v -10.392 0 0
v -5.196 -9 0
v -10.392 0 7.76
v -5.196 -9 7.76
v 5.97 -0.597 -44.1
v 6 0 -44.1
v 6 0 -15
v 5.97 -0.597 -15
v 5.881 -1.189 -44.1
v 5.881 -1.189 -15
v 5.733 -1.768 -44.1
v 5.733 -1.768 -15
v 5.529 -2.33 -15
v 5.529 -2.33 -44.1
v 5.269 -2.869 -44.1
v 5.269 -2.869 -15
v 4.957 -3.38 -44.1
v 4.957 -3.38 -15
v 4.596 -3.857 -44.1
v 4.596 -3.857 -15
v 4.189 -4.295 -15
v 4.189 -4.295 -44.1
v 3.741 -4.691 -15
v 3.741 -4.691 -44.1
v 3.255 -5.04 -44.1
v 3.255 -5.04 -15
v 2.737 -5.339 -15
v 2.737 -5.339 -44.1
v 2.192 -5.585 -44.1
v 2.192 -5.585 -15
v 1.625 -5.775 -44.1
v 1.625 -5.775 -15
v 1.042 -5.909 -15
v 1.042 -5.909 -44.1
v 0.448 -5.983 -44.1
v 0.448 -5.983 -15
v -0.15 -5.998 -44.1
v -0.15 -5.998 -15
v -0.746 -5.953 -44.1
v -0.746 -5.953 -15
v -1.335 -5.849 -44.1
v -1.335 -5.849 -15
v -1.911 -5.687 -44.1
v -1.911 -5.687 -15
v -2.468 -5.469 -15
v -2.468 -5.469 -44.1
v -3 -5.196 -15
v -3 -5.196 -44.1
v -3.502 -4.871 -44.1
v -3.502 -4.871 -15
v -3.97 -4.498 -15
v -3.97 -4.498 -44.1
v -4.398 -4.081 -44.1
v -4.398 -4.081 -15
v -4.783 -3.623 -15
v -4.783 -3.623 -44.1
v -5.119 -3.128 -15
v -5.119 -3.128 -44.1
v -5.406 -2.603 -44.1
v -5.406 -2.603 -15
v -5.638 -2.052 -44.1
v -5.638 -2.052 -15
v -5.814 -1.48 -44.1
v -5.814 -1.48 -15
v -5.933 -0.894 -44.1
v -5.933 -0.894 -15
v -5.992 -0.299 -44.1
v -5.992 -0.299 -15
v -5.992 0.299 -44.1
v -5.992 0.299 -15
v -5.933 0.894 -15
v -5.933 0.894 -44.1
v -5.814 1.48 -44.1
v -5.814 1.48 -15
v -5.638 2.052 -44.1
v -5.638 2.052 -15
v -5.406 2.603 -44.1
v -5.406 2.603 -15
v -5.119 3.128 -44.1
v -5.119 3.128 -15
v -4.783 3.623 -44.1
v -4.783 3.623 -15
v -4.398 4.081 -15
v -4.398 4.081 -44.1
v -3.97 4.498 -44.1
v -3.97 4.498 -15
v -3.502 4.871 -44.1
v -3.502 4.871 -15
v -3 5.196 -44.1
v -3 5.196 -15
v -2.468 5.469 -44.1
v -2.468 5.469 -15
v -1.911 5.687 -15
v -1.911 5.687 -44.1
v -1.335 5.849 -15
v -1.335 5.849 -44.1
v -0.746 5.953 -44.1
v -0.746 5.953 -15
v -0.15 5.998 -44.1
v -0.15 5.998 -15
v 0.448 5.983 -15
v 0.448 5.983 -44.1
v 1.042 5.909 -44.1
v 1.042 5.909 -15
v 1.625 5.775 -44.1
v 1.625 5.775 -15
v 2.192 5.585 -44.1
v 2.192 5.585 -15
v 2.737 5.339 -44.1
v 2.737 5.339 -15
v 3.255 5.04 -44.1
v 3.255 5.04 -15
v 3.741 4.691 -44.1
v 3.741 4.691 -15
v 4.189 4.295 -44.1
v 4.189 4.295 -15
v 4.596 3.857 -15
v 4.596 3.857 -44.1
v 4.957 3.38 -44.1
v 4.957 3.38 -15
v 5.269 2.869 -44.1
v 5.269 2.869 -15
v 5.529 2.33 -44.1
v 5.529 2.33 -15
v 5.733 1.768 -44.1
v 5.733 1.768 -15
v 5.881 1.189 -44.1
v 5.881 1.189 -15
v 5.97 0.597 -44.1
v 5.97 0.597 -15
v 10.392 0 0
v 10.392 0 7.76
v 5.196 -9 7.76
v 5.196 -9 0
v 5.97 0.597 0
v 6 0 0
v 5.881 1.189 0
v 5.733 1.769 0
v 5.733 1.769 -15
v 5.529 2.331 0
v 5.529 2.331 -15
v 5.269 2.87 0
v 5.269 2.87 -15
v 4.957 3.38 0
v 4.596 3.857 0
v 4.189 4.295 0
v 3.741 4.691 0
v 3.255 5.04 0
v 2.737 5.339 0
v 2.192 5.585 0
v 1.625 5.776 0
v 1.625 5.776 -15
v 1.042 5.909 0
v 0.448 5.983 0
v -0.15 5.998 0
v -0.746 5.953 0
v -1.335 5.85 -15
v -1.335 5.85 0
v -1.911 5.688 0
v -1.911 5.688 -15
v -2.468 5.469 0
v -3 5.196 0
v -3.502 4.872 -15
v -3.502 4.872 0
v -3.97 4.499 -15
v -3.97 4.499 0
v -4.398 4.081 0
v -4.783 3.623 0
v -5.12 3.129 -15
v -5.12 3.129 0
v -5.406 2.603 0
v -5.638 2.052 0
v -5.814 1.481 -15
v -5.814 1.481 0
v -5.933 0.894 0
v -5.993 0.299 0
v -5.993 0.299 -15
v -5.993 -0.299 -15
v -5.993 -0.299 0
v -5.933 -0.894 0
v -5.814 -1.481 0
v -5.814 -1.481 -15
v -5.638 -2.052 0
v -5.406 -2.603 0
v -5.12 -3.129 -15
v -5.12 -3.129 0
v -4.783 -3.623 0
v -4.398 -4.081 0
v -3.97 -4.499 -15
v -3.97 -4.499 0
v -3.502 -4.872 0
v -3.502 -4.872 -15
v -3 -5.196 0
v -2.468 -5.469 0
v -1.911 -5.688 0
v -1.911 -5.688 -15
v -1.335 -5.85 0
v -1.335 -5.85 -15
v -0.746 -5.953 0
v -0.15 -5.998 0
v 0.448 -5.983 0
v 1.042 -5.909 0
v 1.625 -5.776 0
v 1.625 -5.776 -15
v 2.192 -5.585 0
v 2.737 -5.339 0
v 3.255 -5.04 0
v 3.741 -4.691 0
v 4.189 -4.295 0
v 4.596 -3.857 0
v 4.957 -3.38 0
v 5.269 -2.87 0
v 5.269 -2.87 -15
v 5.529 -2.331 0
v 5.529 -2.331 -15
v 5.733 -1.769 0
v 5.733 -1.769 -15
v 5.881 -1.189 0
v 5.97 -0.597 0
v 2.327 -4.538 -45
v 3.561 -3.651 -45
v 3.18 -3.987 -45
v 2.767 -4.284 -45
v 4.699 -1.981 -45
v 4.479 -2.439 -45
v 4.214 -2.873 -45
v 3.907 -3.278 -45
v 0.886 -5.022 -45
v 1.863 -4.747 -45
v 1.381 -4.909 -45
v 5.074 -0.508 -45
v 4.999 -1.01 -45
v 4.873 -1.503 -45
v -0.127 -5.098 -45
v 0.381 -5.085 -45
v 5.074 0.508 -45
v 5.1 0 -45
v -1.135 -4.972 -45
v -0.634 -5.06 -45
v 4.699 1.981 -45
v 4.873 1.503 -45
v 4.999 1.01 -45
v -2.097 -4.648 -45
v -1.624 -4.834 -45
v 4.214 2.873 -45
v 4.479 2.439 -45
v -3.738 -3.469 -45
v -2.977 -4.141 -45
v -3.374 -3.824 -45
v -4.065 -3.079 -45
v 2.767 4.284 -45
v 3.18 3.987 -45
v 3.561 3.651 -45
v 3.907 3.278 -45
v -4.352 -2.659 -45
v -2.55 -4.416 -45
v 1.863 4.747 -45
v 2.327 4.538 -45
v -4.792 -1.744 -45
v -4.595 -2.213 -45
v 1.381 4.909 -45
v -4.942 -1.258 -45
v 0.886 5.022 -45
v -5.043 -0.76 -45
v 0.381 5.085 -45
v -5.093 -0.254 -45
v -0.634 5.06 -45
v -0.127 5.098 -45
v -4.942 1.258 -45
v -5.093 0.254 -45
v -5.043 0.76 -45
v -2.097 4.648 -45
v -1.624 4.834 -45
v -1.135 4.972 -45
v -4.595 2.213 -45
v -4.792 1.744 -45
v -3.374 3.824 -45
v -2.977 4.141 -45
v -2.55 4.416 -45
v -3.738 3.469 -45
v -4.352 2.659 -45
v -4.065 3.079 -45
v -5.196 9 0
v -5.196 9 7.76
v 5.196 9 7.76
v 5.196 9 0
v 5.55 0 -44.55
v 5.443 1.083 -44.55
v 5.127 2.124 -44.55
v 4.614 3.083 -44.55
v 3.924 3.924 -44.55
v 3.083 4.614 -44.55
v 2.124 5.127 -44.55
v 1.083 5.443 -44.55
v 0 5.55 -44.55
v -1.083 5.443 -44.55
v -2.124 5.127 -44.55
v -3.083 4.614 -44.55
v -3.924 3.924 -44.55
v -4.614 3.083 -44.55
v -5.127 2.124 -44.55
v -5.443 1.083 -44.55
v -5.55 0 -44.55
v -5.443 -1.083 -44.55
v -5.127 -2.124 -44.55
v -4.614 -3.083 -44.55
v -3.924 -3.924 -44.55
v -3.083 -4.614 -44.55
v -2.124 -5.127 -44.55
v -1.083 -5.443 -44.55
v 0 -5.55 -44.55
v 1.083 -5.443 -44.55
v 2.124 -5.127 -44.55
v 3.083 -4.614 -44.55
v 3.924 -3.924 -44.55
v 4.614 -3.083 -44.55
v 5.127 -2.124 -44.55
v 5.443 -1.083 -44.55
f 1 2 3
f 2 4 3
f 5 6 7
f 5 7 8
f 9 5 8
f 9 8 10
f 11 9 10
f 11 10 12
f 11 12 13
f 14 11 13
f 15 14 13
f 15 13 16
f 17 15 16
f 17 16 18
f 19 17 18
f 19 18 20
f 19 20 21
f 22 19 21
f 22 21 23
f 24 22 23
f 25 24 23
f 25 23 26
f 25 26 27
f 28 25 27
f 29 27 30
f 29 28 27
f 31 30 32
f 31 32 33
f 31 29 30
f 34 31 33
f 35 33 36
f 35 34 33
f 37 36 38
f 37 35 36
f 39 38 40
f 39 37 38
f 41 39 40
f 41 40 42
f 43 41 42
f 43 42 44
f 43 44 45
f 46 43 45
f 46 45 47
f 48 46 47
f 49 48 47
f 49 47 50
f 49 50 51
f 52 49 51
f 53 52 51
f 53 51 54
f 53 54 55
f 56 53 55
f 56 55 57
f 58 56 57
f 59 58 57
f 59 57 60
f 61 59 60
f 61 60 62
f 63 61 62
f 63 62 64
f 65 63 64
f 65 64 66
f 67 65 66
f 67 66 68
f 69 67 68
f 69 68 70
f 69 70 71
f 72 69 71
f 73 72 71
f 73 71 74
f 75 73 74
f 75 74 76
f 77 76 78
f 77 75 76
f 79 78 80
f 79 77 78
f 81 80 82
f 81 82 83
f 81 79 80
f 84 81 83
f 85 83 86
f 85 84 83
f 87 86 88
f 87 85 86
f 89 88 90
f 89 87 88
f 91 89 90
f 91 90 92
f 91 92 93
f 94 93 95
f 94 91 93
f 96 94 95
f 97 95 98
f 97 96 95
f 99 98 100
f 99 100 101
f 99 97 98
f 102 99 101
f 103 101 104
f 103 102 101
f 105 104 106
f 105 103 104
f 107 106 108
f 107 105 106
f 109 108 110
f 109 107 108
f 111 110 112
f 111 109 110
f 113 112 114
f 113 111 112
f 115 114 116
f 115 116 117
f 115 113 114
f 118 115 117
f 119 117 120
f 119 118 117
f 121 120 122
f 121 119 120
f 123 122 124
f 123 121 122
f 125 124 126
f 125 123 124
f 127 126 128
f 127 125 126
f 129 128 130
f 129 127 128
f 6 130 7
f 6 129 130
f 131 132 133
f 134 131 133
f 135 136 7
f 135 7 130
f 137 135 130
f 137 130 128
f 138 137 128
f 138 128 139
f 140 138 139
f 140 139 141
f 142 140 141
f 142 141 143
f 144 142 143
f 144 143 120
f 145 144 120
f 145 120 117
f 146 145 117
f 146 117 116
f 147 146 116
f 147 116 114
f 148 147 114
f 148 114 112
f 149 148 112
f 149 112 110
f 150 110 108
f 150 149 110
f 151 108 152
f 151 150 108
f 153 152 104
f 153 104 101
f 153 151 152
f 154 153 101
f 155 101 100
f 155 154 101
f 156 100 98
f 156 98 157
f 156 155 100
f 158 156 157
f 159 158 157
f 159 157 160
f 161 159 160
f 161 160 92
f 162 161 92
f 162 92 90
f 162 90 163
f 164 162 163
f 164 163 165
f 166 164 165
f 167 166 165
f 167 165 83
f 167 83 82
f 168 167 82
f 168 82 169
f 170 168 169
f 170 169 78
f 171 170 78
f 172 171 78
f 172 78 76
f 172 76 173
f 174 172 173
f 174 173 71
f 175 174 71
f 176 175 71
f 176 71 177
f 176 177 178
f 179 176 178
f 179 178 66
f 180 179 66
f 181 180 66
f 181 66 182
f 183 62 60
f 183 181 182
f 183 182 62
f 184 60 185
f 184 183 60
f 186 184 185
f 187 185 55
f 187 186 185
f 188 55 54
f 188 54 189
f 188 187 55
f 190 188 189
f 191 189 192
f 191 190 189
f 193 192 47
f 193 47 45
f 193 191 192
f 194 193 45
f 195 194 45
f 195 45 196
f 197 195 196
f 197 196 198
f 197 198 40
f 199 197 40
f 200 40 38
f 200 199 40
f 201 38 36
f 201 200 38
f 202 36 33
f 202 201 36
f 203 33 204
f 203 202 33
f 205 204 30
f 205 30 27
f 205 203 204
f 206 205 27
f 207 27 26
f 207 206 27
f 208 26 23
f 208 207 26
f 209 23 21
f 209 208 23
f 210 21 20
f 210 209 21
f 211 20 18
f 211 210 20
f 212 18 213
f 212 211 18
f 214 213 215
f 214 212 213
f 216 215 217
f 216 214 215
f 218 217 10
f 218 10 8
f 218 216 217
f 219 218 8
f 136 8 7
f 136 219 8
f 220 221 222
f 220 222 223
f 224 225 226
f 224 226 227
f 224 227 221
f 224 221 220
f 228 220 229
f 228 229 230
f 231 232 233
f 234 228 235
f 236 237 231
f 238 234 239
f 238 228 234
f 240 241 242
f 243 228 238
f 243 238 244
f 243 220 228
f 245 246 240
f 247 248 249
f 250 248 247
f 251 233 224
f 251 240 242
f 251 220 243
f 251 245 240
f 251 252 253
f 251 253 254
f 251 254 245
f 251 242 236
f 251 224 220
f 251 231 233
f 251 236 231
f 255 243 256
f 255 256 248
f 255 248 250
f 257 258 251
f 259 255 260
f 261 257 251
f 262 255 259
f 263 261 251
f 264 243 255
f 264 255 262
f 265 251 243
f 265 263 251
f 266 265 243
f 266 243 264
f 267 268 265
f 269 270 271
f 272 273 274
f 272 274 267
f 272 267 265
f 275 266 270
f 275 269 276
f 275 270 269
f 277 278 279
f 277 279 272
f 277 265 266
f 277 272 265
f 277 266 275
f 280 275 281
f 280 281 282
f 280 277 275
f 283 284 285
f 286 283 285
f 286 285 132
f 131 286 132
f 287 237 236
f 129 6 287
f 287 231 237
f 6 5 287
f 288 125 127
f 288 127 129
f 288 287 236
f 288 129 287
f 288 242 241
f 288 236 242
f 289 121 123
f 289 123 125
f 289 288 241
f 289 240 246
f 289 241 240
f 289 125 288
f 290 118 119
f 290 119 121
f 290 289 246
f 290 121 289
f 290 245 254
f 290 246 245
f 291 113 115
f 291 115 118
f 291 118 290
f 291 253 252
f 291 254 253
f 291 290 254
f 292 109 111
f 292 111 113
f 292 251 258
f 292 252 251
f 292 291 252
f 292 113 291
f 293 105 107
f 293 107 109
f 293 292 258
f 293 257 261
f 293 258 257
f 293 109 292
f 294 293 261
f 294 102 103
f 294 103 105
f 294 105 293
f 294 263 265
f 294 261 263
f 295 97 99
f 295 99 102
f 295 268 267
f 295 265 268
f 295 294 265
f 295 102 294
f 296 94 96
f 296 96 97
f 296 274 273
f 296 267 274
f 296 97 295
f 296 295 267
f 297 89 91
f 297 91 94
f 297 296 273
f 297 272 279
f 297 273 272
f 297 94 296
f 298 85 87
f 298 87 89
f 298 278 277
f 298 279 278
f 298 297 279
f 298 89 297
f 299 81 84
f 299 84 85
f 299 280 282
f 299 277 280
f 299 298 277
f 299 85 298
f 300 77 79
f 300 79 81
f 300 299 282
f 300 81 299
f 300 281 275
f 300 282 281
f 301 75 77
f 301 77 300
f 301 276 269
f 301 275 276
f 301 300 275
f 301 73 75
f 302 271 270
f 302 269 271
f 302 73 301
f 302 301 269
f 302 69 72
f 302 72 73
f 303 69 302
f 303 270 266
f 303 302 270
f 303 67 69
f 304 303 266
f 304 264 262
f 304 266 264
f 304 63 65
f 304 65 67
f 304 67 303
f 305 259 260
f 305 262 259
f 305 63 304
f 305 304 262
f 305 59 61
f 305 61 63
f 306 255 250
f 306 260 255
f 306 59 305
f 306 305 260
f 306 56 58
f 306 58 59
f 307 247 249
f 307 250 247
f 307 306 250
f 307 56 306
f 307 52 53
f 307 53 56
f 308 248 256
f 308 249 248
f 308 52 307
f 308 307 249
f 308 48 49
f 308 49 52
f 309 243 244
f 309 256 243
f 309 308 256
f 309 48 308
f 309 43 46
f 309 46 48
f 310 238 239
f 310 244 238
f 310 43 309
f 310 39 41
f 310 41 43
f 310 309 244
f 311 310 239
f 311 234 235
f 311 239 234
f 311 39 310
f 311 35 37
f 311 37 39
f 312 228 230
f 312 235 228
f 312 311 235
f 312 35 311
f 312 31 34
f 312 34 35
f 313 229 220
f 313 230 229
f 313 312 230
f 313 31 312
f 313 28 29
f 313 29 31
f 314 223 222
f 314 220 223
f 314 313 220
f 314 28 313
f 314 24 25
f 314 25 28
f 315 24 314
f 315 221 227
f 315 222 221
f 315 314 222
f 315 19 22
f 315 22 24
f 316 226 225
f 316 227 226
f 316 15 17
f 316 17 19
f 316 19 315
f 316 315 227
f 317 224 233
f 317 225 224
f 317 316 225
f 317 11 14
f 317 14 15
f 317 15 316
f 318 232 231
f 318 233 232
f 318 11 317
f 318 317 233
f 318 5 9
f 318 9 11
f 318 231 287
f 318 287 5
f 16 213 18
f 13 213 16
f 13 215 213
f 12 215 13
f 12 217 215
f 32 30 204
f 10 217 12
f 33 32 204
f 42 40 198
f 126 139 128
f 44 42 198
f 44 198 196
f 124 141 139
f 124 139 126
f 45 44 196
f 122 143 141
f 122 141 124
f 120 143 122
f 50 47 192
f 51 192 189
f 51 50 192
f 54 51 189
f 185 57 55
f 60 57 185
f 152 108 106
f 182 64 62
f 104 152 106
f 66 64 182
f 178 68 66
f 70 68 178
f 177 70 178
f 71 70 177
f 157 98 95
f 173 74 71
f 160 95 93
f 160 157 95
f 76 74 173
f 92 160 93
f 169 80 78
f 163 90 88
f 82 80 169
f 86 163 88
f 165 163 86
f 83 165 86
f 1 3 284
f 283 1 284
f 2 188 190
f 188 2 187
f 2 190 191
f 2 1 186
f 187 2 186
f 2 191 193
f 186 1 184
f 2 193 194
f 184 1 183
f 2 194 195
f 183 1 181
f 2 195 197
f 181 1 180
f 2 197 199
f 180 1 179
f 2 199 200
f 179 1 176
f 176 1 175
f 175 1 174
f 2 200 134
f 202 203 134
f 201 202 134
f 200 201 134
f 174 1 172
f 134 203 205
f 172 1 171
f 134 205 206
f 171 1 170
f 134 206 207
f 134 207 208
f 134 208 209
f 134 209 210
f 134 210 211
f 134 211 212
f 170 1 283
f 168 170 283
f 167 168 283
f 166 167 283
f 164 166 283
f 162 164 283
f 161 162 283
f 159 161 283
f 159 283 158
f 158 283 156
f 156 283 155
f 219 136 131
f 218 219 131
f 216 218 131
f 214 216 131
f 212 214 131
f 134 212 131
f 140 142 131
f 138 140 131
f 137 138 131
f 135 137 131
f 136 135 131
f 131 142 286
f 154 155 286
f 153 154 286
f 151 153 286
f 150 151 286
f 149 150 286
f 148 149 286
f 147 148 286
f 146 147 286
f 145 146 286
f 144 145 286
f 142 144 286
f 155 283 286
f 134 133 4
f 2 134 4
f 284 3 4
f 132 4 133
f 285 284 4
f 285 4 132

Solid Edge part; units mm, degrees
sketch "Sketch1" plane through (0, 0, 0) normal (0, 0, 1) x (1, 0, 0)
  circle A0 centre (0, 0) radius 10.44
  dimension "D1" = 20.88
extrude "Protrusion1" add sketch "Sketch1" along normal blind 7.76
sketch "Sketch2" plane through (0, 0, 0) normal (0, 0, -1) x (1, 0, 0)
  circle A0 centre (0, 0) radius 6
extrude "Protrusion2" add sketch "Sketch2" along normal blind 45
sketch "Sketch3" plane through (0, 0, -45) normal (0, 0, -1) x (1, 0, 0)
  circle A0 centre (0, 0) radius 5.9997
extrude "Cutout1" cut sketch "Sketch3" against normal blind 30 flip side to cut
chamfer "Chamfer_1" distance 0.9 angle 45 1 edges at (-5.9997, 0, -45)
sketch "Sketch4" plane through (0, 0, 7.76) normal (0, 0, 1) x (1, 0, 0)
  line L0 (-5.2909, 9) -> (5.2909, 9)
  dimension "D1" = 18
extrude "Cutout2" cut sketch "Sketch4" against normal up to next material side at (0, 9.05, 7.76)
pattern_circular "Pattern1" count 6 over 360 about axis through (0, 0, 7.76) along (0, 0, 1) of "Cutout2"
properties part number "119586" material "Steel"
